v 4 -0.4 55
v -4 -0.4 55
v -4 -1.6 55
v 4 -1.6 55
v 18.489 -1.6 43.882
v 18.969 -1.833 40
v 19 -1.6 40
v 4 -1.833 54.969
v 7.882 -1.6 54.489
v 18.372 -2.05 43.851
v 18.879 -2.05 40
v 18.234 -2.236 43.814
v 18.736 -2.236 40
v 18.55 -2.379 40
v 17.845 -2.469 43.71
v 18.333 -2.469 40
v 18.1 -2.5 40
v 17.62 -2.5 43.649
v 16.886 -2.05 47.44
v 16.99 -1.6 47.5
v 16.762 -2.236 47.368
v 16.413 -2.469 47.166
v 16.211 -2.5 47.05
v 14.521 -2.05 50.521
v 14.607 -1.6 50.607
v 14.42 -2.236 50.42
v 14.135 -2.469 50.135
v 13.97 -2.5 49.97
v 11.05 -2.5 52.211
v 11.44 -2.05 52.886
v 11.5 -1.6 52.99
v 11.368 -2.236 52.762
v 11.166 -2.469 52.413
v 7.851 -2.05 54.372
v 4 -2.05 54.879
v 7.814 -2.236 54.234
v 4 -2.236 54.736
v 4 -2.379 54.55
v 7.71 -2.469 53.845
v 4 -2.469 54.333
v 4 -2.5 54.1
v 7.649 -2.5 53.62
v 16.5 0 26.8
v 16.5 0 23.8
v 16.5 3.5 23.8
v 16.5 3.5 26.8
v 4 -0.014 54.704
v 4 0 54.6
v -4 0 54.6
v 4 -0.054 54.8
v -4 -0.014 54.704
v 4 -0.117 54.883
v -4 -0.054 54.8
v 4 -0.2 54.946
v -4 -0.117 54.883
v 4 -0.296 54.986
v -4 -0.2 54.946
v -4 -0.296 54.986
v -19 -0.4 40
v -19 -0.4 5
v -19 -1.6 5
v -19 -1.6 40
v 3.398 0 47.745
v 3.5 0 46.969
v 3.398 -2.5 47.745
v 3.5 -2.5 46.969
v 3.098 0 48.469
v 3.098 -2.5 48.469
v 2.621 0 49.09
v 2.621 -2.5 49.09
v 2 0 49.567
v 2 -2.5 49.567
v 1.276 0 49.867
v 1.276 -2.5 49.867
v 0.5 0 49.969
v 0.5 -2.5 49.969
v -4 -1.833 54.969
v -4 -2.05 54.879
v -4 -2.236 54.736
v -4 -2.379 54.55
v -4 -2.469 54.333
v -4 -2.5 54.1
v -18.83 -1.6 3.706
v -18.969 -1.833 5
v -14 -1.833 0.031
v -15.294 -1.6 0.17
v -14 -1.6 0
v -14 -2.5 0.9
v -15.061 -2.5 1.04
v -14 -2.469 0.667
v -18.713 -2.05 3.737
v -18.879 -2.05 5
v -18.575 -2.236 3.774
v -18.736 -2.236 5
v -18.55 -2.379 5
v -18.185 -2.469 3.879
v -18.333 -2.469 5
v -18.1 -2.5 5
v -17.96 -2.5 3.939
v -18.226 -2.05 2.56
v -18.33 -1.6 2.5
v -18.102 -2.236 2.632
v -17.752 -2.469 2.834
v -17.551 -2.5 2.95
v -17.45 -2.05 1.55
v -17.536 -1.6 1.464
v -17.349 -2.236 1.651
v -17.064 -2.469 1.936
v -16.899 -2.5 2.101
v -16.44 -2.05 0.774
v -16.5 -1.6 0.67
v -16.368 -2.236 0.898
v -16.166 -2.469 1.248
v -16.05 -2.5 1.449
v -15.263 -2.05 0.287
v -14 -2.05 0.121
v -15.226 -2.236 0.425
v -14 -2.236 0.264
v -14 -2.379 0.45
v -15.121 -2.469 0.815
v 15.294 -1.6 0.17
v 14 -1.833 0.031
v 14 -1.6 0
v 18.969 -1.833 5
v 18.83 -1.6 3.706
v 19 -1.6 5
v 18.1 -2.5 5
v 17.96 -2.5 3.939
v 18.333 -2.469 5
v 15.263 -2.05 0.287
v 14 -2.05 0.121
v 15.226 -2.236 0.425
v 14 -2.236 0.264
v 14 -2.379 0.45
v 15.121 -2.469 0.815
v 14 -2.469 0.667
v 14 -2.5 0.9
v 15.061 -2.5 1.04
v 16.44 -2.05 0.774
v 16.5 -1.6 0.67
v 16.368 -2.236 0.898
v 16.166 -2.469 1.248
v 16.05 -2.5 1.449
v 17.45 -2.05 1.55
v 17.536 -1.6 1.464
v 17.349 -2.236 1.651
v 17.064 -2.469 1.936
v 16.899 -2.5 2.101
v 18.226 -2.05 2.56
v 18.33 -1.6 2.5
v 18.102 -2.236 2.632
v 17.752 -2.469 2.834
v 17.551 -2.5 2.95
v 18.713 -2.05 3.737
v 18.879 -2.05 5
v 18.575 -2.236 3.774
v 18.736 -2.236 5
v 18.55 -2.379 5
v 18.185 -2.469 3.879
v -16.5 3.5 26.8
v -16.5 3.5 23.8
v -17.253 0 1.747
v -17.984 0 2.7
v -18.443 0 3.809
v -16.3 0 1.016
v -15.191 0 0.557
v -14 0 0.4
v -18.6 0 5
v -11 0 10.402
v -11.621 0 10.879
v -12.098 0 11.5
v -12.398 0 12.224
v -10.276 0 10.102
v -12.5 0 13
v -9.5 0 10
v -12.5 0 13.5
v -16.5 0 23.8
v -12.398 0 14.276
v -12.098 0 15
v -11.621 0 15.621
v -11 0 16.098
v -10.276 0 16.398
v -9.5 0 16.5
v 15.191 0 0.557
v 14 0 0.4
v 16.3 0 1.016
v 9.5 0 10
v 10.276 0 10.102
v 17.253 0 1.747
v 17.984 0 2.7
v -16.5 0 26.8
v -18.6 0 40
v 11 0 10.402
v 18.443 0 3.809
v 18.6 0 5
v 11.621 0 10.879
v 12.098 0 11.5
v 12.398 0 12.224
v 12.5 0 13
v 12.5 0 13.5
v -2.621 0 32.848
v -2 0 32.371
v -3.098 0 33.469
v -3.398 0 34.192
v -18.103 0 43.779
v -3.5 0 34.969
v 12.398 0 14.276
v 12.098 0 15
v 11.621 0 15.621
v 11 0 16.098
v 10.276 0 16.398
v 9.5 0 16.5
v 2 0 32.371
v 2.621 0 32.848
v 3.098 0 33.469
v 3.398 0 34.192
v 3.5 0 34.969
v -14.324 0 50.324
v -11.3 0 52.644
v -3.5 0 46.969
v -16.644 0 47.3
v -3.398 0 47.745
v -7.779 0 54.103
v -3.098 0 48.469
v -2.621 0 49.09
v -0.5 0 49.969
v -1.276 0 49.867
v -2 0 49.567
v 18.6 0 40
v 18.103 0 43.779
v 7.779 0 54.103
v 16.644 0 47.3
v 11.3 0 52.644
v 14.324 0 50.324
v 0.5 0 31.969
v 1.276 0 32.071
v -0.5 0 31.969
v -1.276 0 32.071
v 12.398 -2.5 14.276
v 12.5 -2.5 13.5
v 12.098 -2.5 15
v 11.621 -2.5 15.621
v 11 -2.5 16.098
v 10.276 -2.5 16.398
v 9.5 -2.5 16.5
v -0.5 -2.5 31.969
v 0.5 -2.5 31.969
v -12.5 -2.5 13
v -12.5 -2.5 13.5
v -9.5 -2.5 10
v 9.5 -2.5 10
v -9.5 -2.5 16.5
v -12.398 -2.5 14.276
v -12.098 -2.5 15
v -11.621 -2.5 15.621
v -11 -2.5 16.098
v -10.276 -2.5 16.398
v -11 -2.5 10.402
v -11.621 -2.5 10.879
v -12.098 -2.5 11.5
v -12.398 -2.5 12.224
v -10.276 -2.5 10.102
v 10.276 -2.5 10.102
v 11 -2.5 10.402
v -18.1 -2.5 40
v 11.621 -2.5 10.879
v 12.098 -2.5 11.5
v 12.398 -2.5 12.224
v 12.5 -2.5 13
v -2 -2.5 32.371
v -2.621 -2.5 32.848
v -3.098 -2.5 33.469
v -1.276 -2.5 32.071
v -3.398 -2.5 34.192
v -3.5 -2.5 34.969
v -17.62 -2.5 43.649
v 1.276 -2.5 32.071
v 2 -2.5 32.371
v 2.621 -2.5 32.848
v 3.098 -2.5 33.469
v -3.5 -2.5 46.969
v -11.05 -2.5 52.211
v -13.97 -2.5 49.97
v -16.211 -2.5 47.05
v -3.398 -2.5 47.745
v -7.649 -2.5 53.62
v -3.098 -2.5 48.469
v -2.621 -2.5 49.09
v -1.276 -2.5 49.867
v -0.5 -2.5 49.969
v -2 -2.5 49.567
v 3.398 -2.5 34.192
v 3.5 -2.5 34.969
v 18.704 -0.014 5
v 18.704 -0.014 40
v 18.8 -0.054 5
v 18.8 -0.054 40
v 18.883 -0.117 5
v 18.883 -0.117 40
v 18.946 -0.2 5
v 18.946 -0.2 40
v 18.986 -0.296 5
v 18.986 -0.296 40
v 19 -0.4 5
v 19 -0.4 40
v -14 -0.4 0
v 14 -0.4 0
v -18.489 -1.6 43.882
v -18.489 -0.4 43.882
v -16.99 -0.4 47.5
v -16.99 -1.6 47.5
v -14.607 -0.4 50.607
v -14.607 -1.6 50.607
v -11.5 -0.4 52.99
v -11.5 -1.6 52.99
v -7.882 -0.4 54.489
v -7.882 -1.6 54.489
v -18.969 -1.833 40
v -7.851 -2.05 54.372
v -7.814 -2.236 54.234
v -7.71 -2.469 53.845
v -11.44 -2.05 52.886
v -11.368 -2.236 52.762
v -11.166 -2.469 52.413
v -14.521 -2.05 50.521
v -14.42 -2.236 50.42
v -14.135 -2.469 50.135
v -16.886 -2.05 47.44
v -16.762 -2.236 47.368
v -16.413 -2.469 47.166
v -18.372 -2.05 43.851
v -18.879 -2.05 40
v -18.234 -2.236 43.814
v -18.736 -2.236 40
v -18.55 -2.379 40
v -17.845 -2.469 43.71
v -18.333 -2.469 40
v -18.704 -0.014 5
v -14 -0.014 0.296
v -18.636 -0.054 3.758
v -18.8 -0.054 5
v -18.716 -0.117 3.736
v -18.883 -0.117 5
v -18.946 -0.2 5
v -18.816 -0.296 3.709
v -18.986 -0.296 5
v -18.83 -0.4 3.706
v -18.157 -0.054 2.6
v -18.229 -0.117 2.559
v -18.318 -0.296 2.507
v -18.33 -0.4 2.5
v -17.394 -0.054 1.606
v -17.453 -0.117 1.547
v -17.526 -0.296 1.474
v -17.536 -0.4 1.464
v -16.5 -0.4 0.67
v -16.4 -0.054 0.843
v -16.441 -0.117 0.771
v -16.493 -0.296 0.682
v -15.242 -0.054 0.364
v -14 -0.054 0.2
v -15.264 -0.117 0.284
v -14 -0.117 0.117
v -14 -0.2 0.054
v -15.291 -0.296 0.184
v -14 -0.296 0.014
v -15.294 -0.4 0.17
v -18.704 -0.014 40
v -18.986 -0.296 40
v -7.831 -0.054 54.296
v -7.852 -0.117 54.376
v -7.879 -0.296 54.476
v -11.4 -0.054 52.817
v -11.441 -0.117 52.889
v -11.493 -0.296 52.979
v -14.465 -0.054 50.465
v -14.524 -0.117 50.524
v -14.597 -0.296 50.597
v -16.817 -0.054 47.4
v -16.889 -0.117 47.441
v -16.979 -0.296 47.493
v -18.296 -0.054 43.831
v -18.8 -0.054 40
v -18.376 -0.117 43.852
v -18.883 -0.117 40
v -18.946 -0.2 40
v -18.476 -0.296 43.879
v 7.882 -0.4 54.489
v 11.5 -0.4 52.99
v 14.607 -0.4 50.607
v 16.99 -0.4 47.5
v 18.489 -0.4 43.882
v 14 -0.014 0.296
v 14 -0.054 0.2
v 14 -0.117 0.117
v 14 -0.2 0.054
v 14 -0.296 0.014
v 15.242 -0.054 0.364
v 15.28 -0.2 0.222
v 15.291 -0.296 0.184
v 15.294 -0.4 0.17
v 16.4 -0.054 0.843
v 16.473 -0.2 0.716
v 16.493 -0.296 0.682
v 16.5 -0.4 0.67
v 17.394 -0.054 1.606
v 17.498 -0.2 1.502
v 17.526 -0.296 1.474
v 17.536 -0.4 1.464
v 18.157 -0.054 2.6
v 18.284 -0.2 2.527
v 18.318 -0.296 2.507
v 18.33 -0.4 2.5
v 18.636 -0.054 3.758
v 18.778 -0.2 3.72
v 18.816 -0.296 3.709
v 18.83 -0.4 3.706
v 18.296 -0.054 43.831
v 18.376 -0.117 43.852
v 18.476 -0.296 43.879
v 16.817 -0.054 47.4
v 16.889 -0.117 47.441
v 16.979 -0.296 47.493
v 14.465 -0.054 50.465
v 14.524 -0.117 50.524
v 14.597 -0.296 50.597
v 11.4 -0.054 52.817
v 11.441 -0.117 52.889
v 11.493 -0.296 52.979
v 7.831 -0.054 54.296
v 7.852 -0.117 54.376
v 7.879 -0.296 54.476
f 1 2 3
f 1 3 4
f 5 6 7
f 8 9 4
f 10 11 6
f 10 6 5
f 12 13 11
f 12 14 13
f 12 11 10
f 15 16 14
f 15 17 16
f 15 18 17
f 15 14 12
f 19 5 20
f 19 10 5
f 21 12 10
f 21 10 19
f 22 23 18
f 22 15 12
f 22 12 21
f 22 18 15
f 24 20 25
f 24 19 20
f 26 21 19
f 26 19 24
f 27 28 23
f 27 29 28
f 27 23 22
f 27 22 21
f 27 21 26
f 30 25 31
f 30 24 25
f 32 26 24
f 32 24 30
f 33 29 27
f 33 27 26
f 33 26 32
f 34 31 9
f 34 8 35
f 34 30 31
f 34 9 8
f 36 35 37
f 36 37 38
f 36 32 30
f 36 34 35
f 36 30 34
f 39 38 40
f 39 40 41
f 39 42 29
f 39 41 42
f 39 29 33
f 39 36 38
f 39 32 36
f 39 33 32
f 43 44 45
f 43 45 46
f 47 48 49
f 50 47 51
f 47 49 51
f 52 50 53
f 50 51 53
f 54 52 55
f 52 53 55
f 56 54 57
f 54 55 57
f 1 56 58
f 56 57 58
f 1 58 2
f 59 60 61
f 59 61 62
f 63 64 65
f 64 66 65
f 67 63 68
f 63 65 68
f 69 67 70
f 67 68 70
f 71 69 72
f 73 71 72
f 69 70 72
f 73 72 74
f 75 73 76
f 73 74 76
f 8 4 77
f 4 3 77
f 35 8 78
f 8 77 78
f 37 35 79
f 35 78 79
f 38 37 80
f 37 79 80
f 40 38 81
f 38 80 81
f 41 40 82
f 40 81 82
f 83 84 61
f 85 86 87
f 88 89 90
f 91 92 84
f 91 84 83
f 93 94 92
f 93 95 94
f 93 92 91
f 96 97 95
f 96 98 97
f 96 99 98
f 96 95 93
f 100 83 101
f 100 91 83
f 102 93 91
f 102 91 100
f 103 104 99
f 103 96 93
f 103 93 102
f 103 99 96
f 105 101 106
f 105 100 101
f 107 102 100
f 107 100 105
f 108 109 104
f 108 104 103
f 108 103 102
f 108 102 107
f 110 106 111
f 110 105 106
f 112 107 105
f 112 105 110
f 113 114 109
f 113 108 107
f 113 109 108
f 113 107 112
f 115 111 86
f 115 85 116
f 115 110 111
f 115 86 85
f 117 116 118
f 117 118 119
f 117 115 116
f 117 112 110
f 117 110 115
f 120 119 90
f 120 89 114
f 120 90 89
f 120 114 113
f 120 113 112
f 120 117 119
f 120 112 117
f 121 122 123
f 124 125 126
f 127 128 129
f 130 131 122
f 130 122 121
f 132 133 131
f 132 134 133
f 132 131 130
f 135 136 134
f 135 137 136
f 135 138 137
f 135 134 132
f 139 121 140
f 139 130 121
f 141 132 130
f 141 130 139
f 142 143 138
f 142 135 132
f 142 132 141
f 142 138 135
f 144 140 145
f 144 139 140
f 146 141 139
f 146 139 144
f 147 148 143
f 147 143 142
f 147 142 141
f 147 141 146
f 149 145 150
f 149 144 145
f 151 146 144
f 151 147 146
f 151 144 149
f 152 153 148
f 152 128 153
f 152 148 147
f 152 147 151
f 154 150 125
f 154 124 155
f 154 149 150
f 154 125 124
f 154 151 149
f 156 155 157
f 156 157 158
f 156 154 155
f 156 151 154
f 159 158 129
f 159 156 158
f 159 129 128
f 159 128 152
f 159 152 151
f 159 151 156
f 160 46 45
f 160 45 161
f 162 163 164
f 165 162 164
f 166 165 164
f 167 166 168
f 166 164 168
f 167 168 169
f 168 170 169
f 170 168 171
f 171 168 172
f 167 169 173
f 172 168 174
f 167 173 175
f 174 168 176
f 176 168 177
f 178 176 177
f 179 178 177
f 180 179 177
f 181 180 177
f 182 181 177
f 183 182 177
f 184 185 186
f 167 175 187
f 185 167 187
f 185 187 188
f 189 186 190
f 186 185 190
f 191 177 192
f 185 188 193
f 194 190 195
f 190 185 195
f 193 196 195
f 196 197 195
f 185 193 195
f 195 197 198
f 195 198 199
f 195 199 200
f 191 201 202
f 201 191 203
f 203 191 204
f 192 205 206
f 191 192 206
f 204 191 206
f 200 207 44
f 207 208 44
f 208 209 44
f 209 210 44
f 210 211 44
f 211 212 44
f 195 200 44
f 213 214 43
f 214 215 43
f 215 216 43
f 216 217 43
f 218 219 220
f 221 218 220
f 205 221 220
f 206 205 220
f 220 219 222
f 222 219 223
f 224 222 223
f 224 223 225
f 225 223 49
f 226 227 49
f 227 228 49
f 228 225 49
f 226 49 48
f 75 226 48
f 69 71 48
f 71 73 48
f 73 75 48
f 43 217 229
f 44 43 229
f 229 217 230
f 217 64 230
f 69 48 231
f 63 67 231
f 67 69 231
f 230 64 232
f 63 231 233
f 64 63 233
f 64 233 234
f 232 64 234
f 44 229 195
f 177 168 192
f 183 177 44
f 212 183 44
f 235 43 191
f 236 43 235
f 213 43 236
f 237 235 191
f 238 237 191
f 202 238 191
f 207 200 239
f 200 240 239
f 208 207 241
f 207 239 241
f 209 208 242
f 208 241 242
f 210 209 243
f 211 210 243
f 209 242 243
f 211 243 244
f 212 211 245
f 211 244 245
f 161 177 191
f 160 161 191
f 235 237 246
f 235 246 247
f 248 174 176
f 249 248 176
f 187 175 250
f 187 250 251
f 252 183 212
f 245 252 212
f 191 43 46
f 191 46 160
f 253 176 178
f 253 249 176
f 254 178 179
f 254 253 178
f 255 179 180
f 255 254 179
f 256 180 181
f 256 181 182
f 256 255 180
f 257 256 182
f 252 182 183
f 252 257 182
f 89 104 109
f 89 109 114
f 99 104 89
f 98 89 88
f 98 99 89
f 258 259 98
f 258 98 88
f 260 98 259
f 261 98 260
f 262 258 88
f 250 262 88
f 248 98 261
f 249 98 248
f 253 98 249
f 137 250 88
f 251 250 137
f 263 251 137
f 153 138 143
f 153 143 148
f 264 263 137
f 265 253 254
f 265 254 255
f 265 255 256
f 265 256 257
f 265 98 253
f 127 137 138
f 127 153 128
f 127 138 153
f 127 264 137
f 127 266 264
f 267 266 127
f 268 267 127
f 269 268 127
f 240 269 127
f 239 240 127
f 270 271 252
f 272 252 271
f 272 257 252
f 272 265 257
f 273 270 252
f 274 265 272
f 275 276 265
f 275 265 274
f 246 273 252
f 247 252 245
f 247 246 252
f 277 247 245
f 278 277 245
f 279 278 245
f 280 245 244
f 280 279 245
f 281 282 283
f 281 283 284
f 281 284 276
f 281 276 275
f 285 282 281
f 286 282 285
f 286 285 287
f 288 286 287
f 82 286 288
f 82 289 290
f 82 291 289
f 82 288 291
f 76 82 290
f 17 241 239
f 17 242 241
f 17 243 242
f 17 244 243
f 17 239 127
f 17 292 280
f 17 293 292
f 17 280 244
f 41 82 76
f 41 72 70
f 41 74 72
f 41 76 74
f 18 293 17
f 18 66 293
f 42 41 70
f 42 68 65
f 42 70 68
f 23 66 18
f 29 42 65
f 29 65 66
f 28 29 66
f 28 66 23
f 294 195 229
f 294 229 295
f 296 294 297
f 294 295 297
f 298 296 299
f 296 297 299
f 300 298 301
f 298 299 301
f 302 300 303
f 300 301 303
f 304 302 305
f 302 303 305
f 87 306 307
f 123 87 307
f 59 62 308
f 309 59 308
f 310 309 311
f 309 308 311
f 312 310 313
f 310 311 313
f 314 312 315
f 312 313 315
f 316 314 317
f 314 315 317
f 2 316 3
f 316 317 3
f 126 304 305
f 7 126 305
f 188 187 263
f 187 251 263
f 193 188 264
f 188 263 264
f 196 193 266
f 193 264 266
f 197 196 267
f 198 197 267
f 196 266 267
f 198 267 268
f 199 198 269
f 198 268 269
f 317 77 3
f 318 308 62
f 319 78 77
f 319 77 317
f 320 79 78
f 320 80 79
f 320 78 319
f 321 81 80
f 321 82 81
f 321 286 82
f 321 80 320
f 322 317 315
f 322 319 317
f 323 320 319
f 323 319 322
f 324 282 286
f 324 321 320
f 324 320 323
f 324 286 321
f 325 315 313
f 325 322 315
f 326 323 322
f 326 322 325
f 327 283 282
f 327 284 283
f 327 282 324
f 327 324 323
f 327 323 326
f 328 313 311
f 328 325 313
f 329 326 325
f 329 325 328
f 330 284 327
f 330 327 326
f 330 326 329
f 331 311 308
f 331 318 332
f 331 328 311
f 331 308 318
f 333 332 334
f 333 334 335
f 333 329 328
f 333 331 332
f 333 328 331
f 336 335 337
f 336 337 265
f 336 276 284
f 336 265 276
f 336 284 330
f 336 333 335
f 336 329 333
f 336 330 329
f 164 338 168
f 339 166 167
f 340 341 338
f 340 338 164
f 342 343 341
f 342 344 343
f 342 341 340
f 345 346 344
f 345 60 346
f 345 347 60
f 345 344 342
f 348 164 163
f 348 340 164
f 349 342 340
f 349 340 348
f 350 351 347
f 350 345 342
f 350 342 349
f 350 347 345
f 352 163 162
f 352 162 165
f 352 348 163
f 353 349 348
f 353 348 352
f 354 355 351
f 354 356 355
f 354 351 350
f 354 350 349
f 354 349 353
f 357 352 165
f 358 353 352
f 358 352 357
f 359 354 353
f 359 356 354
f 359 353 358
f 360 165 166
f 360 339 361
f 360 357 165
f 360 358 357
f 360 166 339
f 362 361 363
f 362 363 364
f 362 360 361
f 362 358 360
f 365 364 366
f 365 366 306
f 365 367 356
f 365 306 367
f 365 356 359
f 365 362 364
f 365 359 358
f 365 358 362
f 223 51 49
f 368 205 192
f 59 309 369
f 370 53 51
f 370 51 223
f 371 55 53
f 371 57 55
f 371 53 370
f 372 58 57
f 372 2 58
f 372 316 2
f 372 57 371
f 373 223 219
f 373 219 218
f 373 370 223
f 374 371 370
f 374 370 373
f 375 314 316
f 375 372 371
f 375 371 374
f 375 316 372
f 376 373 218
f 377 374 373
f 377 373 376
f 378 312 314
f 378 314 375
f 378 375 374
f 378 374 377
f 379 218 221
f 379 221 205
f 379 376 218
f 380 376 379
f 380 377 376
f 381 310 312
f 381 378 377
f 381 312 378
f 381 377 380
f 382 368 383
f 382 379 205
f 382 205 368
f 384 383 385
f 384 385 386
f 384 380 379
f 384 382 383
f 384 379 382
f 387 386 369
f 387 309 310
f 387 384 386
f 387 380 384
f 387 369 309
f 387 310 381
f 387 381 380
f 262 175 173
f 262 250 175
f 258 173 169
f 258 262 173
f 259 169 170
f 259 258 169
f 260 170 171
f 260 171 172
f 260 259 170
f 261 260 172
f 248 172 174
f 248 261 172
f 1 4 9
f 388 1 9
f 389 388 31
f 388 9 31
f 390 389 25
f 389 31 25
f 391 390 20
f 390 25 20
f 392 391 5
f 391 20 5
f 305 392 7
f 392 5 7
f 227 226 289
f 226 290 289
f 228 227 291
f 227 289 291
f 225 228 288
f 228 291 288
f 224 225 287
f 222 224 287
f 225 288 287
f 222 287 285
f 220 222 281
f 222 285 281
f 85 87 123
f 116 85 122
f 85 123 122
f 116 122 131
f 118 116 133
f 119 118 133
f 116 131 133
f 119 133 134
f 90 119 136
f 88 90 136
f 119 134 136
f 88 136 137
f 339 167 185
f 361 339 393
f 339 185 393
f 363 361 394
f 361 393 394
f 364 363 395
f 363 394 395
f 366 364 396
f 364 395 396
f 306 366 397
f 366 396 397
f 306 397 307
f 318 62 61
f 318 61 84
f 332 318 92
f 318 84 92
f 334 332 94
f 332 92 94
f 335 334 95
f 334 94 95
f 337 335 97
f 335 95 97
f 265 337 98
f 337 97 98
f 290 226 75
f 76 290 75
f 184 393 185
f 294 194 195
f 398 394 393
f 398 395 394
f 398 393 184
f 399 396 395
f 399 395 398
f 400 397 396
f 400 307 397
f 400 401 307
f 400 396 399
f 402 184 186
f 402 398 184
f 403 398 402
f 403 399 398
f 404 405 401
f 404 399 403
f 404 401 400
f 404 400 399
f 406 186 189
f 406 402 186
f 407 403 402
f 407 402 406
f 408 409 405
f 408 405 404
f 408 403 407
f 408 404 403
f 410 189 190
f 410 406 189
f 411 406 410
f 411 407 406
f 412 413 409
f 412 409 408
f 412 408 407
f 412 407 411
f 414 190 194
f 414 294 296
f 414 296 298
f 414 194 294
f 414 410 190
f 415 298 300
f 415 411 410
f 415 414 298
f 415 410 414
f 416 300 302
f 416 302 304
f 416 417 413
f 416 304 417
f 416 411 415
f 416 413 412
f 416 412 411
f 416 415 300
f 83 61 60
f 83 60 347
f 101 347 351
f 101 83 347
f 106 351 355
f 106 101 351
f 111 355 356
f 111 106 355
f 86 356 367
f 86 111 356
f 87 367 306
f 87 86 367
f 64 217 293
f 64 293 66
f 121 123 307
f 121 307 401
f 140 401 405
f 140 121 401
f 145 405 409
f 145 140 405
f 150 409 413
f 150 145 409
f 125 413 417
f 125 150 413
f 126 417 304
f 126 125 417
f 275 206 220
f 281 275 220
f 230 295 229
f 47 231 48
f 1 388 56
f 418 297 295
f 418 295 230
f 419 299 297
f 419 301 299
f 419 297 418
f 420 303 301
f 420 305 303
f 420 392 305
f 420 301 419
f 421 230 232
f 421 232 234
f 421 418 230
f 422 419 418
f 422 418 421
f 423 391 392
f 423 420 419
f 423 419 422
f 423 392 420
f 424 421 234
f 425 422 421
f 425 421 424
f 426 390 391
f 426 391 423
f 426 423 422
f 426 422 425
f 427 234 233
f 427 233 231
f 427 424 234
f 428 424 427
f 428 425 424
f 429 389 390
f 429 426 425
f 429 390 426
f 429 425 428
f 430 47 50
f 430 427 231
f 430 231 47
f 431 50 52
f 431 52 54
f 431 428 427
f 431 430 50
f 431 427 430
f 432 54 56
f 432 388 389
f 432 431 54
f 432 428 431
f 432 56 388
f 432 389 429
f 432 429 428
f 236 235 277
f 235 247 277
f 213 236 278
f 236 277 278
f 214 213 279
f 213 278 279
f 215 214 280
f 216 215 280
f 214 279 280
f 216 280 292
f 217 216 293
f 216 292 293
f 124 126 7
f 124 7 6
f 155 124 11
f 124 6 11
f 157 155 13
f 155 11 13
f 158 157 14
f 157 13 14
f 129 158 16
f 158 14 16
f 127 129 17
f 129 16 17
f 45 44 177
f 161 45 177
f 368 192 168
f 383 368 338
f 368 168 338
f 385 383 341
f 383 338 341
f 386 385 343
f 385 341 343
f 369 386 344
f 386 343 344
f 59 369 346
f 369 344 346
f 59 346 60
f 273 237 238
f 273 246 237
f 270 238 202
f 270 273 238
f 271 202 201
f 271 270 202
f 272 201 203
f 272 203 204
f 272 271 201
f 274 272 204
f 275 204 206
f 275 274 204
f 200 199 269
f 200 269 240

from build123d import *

# Parameters (mm, degrees)
F0_W     = 38
F0_H     = 55
F0_W_2   = 25
F0_H_2   = 6.5
F0_W_3   = 7
F0_H_3   = 18
F1_DEPTH = 2.5
F2_R     = 15
F3_R     = 5
F4_R     = 3
F5_W     = 33
F5_H     = 3
F6_DEPTH = 3.5
F7_R     = 0.4
F8_R     = 0.9


with BuildPart() as f1:
    # F0 (on Front) → F1 (new body)
    with BuildSketch(Plane.XZ):
        with Locations((0, 27.5)):
            Rectangle(F0_W, F0_H)
        with Locations((0, 13.25)):
            Rectangle(F0_W_2, F0_H_2, mode=Mode.SUBTRACT)
        with Locations((0, 40.968925)):
            Rectangle(F0_W_3, F0_H_3, mode=Mode.SUBTRACT)
    extrude(amount=F1_DEPTH)

    # F2
    f2_edges = [f1.edges().sort_by_distance(p)[0] for p in [
        (-19, -1.25, 55),
        (19, -1.25, 55),
    ]]
    fillet(f2_edges, radius=F2_R)

    # F3
    f3_edges = [f1.edges().sort_by_distance(p)[0] for p in [
        (-19, -1.25, 0),
        (19, -1.25, 0),
    ]]
    fillet(f3_edges, radius=F3_R)

    # F4
    f4_edges = [f1.edges().sort_by_distance(p)[0] for p in [
        (-12.5, -1.25, 10),
        (12.5, -1.25, 10),
        (12.5, -1.25, 16.5),
        (-12.5, -1.25, 16.5),
        (-3.5, -1.25, 49.968925),
        (-3.5, -1.25, 31.968925),
        (3.5, -1.25, 31.968925),
        (3.5, -1.25, 49.968925),
    ]]
    fillet(f4_edges, radius=F4_R)

    # F5 (on face) → F6 (join)
    with BuildSketch(Plane(origin=(0, 0, 0), x_dir=(-1, 0, 0), z_dir=(0, 1, 0))):
        with Locations((0, 25.3)):
            Rectangle(F5_W, F5_H)
    extrude(amount=F6_DEPTH)

    # F7
    f7_edges = [f1.edges().sort_by_distance(p)[0] for p in [
        (19, 0, 22.5),
    ]]
    fillet(f7_edges, radius=F7_R)

    # F8
    f8_edges = [f1.edges().sort_by_distance(p)[0] for p in [
        (19, -2.5, 22.5),
    ]]
    fillet(f8_edges, radius=F8_R)


solid = f1.part
